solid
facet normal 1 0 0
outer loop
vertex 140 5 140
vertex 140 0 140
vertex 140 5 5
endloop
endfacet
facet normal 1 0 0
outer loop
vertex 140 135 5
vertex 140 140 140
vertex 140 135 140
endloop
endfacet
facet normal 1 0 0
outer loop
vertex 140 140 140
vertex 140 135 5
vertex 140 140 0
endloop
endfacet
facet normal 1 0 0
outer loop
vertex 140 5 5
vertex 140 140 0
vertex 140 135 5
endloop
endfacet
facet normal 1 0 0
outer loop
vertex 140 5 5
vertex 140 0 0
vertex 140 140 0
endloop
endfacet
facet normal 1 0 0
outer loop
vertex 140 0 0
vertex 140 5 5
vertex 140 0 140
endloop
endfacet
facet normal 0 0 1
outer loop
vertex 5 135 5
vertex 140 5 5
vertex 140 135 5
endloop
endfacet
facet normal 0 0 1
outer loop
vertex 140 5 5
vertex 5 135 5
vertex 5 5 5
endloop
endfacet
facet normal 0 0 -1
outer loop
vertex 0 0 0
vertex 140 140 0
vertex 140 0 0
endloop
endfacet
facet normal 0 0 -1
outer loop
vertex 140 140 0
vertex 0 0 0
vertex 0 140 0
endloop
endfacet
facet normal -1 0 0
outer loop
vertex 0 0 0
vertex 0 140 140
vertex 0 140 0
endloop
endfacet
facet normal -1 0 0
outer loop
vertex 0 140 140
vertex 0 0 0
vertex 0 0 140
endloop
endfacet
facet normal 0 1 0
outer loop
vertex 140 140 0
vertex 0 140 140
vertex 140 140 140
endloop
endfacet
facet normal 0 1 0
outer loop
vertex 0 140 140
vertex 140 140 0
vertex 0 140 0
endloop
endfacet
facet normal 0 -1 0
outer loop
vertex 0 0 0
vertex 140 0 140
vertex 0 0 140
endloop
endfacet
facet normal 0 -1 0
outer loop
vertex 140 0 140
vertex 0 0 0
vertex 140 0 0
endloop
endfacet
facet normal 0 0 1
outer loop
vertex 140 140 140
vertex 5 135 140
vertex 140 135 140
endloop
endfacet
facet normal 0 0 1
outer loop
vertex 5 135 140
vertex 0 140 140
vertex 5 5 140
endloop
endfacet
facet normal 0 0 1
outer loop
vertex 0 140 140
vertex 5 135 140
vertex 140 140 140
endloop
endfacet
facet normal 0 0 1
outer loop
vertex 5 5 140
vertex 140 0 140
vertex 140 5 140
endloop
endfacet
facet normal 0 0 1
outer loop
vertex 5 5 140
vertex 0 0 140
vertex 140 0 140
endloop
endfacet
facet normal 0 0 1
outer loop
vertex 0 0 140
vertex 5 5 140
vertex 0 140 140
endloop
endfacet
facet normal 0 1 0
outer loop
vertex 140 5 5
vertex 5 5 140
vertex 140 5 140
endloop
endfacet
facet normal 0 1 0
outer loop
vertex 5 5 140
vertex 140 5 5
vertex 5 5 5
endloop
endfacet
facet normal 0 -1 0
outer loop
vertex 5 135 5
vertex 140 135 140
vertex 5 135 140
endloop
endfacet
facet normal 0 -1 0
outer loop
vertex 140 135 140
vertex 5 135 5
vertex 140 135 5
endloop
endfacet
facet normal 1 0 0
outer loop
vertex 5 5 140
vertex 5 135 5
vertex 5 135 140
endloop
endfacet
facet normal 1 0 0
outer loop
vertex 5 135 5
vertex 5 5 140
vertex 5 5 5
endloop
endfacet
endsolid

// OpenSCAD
$fn=50;

t=5;    // thickness
width=140;
depth=140;
heigth=140;

cube(size=[width, depth, t], center=false);

cube(size=[width, t, heigth], center=false);
translate([0, depth - t, 0]) cube(size=[width, t, heigth], center=false);
cube(size=[t, depth, heigth], center=false);
